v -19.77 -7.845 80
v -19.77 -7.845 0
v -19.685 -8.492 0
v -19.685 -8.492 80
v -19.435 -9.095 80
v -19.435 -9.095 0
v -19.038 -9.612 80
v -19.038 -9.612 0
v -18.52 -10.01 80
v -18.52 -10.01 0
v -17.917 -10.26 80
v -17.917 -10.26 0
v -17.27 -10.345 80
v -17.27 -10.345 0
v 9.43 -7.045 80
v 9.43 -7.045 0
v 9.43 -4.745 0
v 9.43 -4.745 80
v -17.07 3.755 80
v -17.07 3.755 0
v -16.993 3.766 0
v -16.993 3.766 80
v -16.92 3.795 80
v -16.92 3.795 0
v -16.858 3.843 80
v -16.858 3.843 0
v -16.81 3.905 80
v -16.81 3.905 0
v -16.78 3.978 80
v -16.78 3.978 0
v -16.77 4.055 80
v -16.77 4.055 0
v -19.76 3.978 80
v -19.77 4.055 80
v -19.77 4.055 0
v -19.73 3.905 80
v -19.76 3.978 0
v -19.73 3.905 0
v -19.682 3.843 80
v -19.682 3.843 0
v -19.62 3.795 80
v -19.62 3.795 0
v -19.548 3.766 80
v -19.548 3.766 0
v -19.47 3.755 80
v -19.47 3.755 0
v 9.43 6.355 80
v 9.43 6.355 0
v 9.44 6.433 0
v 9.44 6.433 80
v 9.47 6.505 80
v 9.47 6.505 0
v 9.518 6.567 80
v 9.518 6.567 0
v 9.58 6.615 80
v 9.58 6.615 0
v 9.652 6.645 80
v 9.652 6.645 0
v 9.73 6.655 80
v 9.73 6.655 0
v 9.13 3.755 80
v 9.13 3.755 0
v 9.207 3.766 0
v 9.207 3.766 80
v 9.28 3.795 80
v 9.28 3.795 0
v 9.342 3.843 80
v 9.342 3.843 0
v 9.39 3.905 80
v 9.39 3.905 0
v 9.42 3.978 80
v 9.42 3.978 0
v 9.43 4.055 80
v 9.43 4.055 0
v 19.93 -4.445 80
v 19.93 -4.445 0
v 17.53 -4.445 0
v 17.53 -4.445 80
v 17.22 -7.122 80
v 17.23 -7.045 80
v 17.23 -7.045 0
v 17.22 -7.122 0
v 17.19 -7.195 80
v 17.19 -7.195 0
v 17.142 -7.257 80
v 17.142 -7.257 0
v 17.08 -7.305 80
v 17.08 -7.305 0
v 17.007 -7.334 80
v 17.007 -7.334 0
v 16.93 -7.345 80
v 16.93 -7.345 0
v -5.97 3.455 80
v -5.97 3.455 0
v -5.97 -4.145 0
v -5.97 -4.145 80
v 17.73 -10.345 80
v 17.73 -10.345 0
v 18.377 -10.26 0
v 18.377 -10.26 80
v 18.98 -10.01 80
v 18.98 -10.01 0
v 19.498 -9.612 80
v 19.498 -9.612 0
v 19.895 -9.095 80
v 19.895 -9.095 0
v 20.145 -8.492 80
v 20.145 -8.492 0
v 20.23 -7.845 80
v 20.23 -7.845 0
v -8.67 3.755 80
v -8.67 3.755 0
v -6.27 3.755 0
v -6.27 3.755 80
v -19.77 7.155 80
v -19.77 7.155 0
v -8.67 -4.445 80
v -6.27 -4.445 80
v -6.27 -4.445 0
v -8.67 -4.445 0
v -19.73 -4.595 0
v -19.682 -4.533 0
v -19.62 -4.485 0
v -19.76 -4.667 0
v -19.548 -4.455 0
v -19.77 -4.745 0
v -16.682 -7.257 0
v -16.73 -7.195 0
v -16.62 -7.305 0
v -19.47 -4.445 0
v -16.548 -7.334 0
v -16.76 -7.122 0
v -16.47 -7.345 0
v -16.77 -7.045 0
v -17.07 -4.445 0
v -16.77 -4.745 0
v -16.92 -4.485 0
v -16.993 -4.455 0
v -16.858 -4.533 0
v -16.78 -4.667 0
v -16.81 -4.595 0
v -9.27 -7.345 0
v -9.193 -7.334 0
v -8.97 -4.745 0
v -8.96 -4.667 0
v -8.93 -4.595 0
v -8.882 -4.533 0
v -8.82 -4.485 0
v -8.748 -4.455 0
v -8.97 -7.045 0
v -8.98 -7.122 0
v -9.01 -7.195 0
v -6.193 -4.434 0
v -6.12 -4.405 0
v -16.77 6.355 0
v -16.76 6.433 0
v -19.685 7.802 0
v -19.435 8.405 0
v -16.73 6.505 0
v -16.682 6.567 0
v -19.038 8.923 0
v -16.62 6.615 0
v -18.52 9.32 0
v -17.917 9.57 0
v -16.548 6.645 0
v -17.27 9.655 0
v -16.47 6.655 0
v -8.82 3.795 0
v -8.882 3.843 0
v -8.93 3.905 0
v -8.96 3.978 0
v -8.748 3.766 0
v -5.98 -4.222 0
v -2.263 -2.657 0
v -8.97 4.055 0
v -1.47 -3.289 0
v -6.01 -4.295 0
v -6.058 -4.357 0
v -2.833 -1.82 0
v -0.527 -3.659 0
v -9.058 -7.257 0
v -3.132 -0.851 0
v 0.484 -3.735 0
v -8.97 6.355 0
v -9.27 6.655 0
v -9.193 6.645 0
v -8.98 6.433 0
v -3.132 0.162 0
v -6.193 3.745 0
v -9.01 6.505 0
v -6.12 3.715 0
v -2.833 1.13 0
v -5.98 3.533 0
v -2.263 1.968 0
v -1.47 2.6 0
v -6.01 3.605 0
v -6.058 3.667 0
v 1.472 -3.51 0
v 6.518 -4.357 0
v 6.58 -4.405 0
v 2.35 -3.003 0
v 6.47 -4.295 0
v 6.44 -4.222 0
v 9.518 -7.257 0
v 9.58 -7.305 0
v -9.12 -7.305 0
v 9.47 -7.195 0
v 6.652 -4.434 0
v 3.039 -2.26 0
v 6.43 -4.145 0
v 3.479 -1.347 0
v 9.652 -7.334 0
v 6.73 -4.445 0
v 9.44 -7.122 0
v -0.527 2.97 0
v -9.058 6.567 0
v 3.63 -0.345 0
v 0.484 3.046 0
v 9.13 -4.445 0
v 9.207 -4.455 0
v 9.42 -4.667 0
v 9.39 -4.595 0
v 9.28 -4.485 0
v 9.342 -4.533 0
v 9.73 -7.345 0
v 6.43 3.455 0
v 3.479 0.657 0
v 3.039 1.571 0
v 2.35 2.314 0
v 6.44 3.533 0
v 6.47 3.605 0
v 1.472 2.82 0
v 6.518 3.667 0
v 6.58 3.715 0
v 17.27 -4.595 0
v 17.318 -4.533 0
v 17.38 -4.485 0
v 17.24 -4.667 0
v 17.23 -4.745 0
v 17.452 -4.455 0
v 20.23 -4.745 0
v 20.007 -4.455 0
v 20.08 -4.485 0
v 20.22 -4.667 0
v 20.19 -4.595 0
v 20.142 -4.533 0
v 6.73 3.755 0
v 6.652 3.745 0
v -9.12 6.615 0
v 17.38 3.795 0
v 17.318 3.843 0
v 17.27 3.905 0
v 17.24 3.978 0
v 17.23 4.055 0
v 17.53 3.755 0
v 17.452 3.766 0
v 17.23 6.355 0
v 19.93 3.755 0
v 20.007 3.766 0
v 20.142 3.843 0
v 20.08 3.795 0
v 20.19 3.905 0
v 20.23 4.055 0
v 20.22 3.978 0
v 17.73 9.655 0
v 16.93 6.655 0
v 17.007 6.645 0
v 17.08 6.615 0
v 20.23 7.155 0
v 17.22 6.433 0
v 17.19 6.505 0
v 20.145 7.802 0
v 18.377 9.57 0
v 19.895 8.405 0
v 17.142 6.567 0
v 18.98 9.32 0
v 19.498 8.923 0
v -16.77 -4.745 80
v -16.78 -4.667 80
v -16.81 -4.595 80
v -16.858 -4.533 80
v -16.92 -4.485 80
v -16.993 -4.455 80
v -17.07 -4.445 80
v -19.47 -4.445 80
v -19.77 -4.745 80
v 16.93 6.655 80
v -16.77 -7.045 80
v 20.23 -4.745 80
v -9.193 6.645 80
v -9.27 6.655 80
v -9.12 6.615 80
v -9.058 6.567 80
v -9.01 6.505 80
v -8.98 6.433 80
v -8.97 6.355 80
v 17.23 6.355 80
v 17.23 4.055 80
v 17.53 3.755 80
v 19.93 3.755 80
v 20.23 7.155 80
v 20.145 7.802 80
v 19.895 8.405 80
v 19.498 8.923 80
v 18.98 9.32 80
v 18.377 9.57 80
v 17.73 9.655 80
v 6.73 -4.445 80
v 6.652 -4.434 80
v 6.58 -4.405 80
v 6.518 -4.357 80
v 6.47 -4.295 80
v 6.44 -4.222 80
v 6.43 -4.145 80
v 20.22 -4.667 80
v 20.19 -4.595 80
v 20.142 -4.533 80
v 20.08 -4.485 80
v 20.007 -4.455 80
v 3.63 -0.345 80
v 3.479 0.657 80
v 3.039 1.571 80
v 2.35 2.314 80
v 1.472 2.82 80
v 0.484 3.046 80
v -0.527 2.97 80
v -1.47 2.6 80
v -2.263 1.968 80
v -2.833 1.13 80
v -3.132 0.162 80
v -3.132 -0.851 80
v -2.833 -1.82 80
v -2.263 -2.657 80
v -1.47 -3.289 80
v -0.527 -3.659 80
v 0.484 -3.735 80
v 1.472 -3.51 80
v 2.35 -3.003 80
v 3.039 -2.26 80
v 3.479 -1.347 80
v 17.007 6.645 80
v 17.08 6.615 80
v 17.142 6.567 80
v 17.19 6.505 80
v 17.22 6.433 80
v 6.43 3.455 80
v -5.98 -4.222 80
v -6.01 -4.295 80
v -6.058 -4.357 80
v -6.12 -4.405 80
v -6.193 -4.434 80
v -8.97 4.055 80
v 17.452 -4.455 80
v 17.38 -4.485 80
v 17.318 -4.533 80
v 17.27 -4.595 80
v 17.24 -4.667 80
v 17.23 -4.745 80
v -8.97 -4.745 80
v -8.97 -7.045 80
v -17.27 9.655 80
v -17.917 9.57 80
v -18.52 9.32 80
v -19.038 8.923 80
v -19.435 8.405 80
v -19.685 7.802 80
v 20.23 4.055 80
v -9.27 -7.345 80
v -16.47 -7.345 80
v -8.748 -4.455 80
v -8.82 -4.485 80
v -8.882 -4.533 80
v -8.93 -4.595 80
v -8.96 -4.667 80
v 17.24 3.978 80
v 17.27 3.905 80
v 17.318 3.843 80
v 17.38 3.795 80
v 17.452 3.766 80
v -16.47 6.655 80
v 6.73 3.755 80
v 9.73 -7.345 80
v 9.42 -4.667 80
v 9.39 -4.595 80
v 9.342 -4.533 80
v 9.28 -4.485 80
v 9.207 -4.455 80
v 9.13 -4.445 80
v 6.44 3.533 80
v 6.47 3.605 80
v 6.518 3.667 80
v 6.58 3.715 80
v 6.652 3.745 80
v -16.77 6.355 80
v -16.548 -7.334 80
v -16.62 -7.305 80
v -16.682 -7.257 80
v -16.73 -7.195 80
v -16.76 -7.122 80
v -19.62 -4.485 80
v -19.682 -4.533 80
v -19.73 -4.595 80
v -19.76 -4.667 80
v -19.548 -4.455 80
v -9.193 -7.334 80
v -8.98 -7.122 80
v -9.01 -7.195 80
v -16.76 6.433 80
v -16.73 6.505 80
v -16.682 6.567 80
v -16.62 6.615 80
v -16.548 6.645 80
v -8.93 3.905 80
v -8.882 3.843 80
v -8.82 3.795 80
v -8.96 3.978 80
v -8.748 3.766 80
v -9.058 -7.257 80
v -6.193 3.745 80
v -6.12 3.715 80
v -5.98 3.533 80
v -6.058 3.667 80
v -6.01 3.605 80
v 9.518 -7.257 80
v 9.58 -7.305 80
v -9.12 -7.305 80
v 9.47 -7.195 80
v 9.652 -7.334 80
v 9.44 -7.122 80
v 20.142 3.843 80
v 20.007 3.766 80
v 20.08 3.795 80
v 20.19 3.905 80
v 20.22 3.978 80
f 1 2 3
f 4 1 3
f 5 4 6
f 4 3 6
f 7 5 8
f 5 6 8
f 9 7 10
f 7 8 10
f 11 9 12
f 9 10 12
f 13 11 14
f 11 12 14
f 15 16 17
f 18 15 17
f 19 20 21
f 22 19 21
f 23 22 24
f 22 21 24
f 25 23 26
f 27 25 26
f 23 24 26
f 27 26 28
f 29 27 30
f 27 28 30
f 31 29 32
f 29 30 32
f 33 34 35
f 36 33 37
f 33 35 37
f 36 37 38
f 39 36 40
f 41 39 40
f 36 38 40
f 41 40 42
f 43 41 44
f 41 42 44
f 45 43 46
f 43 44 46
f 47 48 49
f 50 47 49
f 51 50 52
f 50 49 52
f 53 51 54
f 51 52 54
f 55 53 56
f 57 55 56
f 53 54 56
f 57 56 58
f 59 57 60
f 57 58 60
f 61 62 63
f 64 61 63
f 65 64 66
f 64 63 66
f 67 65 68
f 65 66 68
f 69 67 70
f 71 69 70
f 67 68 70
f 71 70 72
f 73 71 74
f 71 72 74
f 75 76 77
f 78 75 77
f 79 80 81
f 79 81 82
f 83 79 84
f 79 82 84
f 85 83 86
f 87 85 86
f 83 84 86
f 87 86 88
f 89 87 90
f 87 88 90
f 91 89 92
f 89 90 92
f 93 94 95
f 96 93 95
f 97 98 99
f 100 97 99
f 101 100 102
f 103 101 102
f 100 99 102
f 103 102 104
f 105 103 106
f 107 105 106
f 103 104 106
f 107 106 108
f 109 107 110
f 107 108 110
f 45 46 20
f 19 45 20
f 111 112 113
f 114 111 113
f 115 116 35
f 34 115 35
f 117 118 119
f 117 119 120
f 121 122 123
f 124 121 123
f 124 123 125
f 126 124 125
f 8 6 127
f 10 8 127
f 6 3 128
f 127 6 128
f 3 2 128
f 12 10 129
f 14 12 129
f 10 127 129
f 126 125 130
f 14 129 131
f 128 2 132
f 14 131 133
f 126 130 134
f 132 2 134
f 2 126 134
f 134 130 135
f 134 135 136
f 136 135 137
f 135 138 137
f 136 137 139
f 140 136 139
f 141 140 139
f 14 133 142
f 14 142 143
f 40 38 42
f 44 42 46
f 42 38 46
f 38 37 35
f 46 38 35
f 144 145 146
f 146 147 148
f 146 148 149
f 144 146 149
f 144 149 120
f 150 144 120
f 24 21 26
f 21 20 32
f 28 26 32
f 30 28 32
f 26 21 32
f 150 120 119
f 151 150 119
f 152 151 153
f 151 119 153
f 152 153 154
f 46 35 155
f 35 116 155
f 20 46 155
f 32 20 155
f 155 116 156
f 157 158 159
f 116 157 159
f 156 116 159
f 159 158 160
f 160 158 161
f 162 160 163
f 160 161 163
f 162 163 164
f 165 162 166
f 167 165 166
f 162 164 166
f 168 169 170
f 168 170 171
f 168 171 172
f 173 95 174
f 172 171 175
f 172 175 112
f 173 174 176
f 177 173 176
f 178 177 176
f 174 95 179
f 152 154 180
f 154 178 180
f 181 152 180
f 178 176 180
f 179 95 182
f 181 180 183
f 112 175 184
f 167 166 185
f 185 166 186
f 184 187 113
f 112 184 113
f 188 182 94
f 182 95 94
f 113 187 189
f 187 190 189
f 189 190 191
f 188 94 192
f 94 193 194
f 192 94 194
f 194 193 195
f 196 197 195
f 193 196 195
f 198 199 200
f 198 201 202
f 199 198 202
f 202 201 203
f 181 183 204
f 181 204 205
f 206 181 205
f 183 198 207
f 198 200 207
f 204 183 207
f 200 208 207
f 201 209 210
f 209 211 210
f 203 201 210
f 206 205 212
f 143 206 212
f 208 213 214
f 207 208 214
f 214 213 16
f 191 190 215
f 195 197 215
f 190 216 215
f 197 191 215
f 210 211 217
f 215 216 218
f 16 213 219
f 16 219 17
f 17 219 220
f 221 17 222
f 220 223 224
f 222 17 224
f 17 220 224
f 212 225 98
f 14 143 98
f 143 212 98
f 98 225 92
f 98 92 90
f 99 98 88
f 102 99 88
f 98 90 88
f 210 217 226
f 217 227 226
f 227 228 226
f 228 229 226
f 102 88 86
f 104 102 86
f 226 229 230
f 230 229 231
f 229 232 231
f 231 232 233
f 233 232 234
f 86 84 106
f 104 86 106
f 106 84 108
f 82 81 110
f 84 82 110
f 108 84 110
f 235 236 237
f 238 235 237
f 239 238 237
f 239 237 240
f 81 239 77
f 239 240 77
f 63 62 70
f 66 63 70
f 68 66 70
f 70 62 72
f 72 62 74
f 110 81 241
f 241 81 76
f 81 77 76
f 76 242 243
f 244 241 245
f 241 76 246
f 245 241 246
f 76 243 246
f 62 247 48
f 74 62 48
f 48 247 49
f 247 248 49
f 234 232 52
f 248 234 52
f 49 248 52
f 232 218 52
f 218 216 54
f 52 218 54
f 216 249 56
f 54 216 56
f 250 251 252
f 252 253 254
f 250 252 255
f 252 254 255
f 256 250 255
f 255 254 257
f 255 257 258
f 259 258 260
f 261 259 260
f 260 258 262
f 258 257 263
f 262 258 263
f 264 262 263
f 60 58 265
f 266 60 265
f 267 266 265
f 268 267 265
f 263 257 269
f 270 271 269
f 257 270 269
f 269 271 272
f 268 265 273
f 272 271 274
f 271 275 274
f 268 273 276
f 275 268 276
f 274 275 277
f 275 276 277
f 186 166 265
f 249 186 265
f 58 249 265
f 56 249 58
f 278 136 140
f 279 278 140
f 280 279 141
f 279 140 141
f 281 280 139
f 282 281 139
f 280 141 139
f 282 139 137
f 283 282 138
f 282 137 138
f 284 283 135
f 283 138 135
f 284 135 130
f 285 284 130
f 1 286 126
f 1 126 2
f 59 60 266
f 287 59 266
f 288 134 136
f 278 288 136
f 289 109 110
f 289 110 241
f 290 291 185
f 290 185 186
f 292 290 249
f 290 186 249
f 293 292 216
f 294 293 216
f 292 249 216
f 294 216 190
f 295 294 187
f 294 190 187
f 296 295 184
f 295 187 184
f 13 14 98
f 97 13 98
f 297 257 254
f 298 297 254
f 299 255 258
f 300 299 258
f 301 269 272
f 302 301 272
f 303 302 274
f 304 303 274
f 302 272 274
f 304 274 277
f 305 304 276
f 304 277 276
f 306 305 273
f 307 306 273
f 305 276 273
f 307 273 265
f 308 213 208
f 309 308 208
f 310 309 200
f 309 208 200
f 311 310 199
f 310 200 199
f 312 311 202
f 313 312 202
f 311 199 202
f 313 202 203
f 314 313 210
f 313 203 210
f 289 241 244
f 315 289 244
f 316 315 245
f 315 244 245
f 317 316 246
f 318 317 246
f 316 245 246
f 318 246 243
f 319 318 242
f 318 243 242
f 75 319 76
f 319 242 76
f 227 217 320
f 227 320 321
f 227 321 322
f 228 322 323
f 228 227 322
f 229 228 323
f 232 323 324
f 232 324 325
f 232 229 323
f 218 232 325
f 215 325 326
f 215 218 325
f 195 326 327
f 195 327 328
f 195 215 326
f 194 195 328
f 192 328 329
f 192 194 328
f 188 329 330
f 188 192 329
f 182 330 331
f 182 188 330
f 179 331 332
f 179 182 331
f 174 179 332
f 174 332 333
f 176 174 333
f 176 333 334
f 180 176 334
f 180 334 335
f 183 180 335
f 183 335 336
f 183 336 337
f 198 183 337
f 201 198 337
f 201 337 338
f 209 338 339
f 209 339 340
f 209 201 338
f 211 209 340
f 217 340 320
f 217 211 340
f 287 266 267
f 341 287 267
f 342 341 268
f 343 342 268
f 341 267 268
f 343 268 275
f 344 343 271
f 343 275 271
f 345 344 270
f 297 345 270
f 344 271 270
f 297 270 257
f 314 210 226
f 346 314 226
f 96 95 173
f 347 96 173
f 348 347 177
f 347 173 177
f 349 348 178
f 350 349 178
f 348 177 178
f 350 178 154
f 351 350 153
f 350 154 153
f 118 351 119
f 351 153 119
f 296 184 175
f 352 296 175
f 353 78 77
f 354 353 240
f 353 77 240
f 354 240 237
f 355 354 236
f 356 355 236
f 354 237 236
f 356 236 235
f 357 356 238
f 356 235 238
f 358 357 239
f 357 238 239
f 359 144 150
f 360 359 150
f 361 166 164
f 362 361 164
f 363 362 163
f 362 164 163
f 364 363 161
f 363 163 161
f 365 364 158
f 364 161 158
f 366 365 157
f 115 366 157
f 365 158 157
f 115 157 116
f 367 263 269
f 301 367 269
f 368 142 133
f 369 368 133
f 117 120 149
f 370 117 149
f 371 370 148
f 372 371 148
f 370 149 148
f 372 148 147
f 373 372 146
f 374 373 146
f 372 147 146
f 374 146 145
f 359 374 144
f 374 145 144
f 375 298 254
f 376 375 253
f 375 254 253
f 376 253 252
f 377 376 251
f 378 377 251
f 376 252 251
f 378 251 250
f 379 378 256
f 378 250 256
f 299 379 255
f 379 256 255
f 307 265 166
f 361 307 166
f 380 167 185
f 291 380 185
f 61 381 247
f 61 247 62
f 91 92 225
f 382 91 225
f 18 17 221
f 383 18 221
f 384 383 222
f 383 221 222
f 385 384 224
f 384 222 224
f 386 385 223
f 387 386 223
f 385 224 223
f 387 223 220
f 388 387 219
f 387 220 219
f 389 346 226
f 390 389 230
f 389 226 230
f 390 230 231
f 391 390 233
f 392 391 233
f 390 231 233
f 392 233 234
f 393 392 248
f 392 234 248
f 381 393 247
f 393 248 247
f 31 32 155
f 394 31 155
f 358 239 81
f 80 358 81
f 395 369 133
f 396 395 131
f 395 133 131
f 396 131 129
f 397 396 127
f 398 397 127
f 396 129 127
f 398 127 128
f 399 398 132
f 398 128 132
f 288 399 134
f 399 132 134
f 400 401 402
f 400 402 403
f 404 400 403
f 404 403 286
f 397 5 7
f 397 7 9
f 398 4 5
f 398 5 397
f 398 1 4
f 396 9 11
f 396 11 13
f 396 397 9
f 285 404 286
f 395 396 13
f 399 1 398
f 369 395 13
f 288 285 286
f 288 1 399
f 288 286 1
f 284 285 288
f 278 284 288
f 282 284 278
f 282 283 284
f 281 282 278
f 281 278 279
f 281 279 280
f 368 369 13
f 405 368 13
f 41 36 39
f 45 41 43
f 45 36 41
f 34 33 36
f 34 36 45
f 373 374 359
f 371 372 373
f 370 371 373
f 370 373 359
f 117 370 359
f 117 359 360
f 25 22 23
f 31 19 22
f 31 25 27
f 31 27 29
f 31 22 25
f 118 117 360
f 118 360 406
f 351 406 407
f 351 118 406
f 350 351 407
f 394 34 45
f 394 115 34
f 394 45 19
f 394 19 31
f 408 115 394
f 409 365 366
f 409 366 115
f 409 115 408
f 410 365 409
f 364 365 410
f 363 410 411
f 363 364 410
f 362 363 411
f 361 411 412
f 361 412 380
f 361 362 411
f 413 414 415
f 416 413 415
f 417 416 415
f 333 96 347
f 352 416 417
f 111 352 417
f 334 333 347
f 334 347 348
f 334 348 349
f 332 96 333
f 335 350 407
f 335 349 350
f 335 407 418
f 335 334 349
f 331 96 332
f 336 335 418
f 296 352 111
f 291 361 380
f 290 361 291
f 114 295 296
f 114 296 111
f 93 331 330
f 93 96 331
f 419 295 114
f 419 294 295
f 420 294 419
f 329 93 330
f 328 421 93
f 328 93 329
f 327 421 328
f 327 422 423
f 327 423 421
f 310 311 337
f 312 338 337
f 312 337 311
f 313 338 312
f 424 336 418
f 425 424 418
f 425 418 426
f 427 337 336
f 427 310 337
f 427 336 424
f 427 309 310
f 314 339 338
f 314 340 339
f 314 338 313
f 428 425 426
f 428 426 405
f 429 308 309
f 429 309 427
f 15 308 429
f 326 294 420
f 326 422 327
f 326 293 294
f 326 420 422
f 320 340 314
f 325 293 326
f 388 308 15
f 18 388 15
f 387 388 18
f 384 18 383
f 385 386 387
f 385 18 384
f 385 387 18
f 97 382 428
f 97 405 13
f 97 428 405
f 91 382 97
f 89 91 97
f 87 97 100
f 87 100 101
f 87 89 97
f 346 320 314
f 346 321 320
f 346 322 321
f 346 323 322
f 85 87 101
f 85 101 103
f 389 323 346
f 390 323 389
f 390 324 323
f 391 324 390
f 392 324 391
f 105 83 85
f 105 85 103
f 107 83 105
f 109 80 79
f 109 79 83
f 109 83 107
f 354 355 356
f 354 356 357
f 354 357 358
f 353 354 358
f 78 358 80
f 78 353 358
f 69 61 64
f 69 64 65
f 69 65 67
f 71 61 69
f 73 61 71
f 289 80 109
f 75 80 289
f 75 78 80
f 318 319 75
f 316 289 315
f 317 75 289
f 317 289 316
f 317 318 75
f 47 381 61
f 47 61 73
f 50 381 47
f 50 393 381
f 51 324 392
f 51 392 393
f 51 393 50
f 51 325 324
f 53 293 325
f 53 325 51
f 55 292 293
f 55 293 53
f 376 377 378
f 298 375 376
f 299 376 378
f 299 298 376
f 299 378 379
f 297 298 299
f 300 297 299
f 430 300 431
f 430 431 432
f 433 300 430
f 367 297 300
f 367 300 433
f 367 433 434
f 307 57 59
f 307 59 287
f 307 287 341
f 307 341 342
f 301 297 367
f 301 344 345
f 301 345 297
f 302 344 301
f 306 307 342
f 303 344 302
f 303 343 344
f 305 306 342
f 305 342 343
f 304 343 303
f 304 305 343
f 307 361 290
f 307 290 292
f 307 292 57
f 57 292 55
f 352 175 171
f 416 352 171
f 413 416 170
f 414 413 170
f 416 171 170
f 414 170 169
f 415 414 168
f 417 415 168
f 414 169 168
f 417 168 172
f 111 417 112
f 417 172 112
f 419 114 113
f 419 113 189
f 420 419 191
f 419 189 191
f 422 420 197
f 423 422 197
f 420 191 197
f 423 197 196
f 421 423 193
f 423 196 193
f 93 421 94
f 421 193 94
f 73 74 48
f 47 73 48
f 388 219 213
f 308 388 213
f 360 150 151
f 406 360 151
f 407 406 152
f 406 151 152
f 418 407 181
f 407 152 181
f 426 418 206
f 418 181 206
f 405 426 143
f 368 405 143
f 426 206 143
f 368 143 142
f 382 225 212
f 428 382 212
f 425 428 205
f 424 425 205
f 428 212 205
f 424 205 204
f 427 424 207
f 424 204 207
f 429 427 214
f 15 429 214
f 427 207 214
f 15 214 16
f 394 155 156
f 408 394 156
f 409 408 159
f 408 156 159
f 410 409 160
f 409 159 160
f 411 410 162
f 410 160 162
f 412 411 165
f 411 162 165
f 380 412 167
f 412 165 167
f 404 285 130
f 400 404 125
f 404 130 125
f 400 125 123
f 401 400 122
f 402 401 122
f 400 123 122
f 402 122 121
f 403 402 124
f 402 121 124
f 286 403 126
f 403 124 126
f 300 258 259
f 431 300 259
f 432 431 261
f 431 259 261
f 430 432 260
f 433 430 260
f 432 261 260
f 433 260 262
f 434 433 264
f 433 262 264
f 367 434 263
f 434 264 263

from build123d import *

# Parameters (mm, degrees)
SKETCH_1_R      = 3.4
EXTRUDE_1_DEPTH = 80


with BuildPart() as part:
    # 草图1 → 凸台-拉伸1 (new body)
    with BuildSketch(Plane.XY):
        with BuildLine():
            Line((20.229808423, 4.055287365), (20.229808423, 7.155287365))
            ThreePointArc((20.229808423, 7.155287365), (19.497575376, 8.923054318), (17.729808423, 9.655287365))
            Line((17.729808423, 9.655287365), (-17.270191577, 9.655287365))
            ThreePointArc((-17.270191577, 9.655287365), (-19.03795853, 8.923054318), (-19.770191577, 7.155287365))
            Line((-19.770191577, 7.155287365), (-19.770191577, 4.055287365))
            ThreePointArc((-19.770191577, 4.055287365), (-19.682323611, 3.843155331), (-19.470191577, 3.755287365))
            Line((-19.470191577, 3.755287365), (-17.070191577, 3.755287365))
            ThreePointArc((-17.070191577, 3.755287365), (-16.858059542, 3.843155331), (-16.770191577, 4.055287365))
            Line((-16.770191577, 4.055287365), (-16.770191577, 6.355287365))
            ThreePointArc((-16.770191577, 6.355287365), (-16.682323611, 6.567419399), (-16.470191577, 6.655287365))
            Line((-16.470191577, 6.655287365), (-9.270191577, 6.655287365))
            ThreePointArc((-9.270191577, 6.655287365), (-9.058059542, 6.567419399), (-8.970191577, 6.355287365))
            Line((-8.970191577, 6.355287365), (-8.970191577, 4.055287365))
            ThreePointArc((-8.970191577, 4.055287365), (-8.882323611, 3.843155331), (-8.670191577, 3.755287365))
            Line((-8.670191577, 3.755287365), (-6.270191577, 3.755287365))
            ThreePointArc((-6.270191577, 3.755287365), (-6.058059542, 3.667419399), (-5.970191577, 3.455287365))
            Line((-5.970191577, 3.455287365), (-5.970191577, -4.144712635))
            ThreePointArc((-5.970191577, -4.144712635), (-6.058059542, -4.356844669), (-6.270191577, -4.444712635))
            Line((-6.270191577, -4.444712635), (-8.670191577, -4.444712635))
            ThreePointArc((-8.670191577, -4.444712635), (-8.882323611, -4.532580601), (-8.970191577, -4.744712635))
            Line((-8.970191577, -4.744712635), (-8.970191577, -7.044712635))
            ThreePointArc((-8.970191577, -7.044712635), (-9.058059542, -7.256844669), (-9.270191577, -7.344712635))
            Line((-9.270191577, -7.344712635), (-16.470191577, -7.344712635))
            ThreePointArc((-16.470191577, -7.344712635), (-16.682323611, -7.256844669), (-16.770191577, -7.044712635))
            Line((-16.770191577, -7.044712635), (-16.770191577, -4.744712635))
            ThreePointArc((-16.770191577, -4.744712635), (-16.858059542, -4.532580601), (-17.070191577, -4.444712635))
            Line((-17.070191577, -4.444712635), (-19.470191577, -4.444712635))
            ThreePointArc((-19.470191577, -4.444712635), (-19.682323611, -4.532580601), (-19.770191577, -4.744712635))
            Line((-19.770191577, -4.744712635), (-19.770191577, -7.844712635))
            ThreePointArc((-19.770191577, -7.844712635), (-19.03795853, -9.612479588), (-17.270191577, -10.344712635))
            Line((-17.270191577, -10.344712635), (17.729808423, -10.344712635))
            ThreePointArc((17.729808423, -10.344712635), (19.497575376, -9.612479588), (20.229808423, -7.844712635))
            Line((20.229808423, -7.844712635), (20.229808423, -4.744712635))
            ThreePointArc((20.229808423, -4.744712635), (20.141940458, -4.532580601), (19.929808423, -4.444712635))
            Line((19.929808423, -4.444712635), (17.529808423, -4.444712635))
            ThreePointArc((17.529808423, -4.444712635), (17.317676389, -4.532580601), (17.229808423, -4.744712635))
            Line((17.229808423, -4.744712635), (17.229808423, -7.044712635))
            ThreePointArc((17.229808423, -7.044712635), (17.141940458, -7.256844669), (16.929808423, -7.344712635))
            Line((16.929808423, -7.344712635), (9.729808423, -7.344712635))
            ThreePointArc((9.729808423, -7.344712635), (9.517676389, -7.256844669), (9.429808423, -7.044712635))
            Line((9.429808423, -7.044712635), (9.429808423, -4.744712635))
            ThreePointArc((9.429808423, -4.744712635), (9.341940458, -4.532580601), (9.129808423, -4.444712635))
            Line((9.129808423, -4.444712635), (6.729808423, -4.444712635))
            ThreePointArc((6.729808423, -4.444712635), (6.517676389, -4.356844669), (6.429808423, -4.144712635))
            Line((6.429808423, -4.144712635), (6.429808423, 3.455287365))
            ThreePointArc((6.429808423, 3.455287365), (6.517676389, 3.667419399), (6.729808423, 3.755287365))
            Line((6.729808423, 3.755287365), (9.129808423, 3.755287365))
            ThreePointArc((9.129808423, 3.755287365), (9.341940458, 3.843155331), (9.429808423, 4.055287365))
            Line((9.429808423, 4.055287365), (9.429808423, 6.355287365))
            ThreePointArc((9.429808423, 6.355287365), (9.517676389, 6.567419399), (9.729808423, 6.655287365))
            Line((9.729808423, 6.655287365), (16.929808423, 6.655287365))
            ThreePointArc((16.929808423, 6.655287365), (17.141940458, 6.567419399), (17.229808423, 6.355287365))
            Line((17.229808423, 6.355287365), (17.229808423, 4.055287365))
            ThreePointArc((17.229808423, 4.055287365), (17.317676389, 3.843155331), (17.529808423, 3.755287365))
            Line((17.529808423, 3.755287365), (19.929808423, 3.755287365))
            ThreePointArc((19.929808423, 3.755287365), (20.141940458, 3.843155331), (20.229808423, 4.055287365))
        make_face()
        with Locations((0.229808423, -0.344712635)):
            Circle(SKETCH_1_R, mode=Mode.SUBTRACT)
    extrude(amount=EXTRUDE_1_DEPTH)


solid = part.part
